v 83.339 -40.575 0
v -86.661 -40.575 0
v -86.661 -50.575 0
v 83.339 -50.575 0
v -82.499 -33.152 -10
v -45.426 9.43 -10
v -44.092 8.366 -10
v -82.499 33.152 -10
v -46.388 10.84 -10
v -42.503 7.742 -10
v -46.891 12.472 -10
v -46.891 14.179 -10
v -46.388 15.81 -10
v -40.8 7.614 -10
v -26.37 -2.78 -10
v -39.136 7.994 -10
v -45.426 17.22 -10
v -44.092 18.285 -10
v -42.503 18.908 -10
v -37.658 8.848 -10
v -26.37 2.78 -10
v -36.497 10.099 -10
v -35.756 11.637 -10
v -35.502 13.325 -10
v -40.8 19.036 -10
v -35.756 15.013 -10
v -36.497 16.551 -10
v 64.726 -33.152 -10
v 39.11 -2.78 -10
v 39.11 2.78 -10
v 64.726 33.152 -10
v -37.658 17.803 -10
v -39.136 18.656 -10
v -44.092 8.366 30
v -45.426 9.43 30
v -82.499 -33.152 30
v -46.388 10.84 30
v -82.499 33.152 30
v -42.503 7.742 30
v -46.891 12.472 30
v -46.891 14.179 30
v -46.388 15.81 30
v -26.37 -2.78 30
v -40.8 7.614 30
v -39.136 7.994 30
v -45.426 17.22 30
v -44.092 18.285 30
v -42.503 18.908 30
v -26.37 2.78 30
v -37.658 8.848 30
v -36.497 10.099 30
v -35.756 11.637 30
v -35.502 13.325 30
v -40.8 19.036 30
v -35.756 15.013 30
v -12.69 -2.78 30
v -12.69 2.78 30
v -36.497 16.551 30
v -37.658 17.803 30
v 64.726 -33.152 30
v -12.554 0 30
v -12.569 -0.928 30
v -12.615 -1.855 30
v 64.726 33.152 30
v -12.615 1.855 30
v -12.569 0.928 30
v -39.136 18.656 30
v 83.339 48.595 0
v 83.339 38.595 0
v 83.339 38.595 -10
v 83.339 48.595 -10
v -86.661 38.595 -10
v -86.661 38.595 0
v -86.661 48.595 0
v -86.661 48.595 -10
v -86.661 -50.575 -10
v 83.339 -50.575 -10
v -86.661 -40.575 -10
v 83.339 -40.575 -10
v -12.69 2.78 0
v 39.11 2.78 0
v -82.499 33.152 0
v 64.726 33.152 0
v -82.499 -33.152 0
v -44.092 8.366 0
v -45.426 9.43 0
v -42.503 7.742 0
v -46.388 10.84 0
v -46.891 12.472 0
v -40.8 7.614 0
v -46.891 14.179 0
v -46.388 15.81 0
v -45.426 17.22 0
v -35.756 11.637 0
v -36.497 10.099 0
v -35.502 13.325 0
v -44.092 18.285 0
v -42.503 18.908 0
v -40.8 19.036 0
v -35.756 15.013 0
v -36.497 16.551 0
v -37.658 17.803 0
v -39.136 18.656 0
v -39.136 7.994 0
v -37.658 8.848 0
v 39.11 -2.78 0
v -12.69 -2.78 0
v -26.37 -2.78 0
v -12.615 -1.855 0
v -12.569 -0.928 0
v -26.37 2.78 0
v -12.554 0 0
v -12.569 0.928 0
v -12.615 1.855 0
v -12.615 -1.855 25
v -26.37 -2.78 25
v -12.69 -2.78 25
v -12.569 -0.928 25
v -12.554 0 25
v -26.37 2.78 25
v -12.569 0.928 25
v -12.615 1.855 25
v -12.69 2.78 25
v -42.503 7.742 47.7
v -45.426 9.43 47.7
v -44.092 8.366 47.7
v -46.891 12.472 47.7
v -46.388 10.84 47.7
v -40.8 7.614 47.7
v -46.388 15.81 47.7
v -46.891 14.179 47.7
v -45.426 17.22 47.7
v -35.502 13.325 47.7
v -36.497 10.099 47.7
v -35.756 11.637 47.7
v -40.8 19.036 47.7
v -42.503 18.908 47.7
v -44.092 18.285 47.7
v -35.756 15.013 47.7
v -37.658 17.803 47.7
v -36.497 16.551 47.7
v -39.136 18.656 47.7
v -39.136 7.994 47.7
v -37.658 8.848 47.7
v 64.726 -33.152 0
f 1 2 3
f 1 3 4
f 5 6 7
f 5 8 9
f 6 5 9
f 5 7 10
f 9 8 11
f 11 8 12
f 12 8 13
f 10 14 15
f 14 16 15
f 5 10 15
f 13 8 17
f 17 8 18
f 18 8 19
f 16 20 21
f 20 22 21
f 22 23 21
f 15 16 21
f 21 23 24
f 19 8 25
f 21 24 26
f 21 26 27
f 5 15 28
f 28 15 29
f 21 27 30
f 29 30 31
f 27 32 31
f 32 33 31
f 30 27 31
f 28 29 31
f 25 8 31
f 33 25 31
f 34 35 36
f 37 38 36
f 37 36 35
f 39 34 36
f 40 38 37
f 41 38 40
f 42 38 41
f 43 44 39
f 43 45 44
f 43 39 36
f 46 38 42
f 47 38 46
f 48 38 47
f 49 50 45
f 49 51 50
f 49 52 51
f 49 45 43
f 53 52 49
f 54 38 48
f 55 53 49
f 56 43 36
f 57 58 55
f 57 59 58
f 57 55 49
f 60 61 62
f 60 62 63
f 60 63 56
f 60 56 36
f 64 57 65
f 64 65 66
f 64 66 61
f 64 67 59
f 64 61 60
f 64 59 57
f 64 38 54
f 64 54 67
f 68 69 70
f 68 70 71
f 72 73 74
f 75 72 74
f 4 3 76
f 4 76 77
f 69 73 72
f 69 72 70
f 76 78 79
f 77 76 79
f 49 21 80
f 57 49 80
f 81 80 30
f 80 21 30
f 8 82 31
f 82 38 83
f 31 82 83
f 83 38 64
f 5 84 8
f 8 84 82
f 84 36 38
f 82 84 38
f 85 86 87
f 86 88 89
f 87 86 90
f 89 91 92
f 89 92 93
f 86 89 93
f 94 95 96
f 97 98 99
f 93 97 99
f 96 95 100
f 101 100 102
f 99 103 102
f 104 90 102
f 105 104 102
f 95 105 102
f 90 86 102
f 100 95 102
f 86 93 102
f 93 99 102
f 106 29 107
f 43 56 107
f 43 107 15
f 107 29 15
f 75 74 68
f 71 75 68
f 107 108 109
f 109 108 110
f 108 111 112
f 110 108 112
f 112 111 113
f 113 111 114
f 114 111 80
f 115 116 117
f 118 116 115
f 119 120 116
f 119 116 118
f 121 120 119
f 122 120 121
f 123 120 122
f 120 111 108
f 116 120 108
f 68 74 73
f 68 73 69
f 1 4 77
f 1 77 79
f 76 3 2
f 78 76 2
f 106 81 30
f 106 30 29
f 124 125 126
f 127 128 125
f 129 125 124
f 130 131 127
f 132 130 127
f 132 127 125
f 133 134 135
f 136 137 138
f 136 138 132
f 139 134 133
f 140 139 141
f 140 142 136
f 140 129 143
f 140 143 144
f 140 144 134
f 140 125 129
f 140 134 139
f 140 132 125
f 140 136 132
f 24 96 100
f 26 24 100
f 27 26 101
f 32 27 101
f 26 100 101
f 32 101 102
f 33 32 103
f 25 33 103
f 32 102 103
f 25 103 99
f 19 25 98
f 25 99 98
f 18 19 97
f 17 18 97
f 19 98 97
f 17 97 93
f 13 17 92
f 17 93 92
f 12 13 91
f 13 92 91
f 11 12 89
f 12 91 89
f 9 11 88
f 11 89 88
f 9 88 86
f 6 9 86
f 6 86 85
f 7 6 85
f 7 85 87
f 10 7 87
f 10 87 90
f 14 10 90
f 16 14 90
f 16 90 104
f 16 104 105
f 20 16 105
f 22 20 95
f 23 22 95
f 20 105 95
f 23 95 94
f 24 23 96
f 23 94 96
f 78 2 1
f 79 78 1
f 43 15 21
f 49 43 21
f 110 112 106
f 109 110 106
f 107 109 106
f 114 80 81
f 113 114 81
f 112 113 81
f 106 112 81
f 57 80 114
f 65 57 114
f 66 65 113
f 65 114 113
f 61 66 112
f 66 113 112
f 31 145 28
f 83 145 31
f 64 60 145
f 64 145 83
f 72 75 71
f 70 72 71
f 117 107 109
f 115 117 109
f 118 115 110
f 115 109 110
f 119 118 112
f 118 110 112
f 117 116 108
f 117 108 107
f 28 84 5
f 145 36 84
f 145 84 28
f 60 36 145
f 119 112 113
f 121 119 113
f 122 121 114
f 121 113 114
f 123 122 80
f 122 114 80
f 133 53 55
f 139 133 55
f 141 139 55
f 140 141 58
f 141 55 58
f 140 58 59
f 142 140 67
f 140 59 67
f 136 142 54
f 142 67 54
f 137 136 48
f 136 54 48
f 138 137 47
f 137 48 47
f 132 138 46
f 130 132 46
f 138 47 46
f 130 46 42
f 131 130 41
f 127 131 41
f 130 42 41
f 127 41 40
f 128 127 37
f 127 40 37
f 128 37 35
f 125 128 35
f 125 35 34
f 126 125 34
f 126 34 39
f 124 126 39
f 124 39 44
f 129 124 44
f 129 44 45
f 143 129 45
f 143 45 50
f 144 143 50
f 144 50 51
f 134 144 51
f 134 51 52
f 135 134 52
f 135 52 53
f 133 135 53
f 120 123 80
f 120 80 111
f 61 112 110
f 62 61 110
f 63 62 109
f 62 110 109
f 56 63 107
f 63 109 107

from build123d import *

# Parameters (mm, degrees)
F0_W         = 147.224877195
F0_H         = 66.3036294561
F0_R         = 5.7267932756
F1_DEPTH     = 10
F0_W_2       = 170
F0_H_2       = 10
F1_FACE_W    = 147.224877195
F1_FACE_H    = 66.3036294561
F1_FACE_W_2  = 65.479831006
F1_FACE_H_2  = 5.5599757362
F1_FACE_R    = 5.7267932756
F1_FACE1_W   = 147.224877195
F1_FACE1_H   = 66.3036294561
F1_FACE1_W_2 = 65.479831006
F1_FACE1_H_2 = 5.5599757362
F1_FACE1_R   = 5.7267932756
F2_DEPTH     = 30
F3_DEPTH     = 25
F4_DEPTH     = 47.7


# Not quite as in the source:
# - the program builds the solid bodies; features that only make, move or delete a surface that nothing else refers to are left out


with BuildPart() as f1:
    # F0 (on Top) → F1 (new body)
    with BuildSketch(Plane.XY):
        with Locations((-8.8865962121, 0)):
            Rectangle(F0_W, F0_H)
        with BuildLine():
            ThreePointArc((-12.689527612, -2.7799878681), (-69.902287741, 0), (-12.689527612, 2.7799878681))
            Line((-12.689527612, 2.7799878681), (39.1101999373, 2.7799878681))
            Line((39.1101999373, 2.7799878681), (39.1101999373, -2.7799878681))
            Line((39.1101999373, -2.7799878681), (-12.689527612, -2.7799878681))
        make_face(mode=Mode.SUBTRACT)
        with BuildLine():
            Line((-26.3696310687, 2.7799878681), (-12.689527612, 2.7799878681))
            ThreePointArc((-12.689527612, 2.7799878681), (-69.902287741, 0), (-12.689527612, -2.7799878681))
            Line((-12.689527612, -2.7799878681), (-26.3696310687, -2.7799878681))
            Line((-26.3696310687, -2.7799878681), (-26.3696310687, 2.7799878681))
        make_face()
        with Locations((-41.2283673889, 13.3251665685)):
            Circle(F0_R, mode=Mode.SUBTRACT)
    extrude(amount=-F1_DEPTH)

    # F0 (on Top) + F1_face (on face) + F1_face1 (on face) → F2 (join)
    with BuildSketch(Plane.XY):
        with BuildLine():
            Line((-26.3696310687, 2.7799878681), (-12.689527612, 2.7799878681))
            ThreePointArc((-12.689527612, 2.7799878681), (-69.902287741, 0), (-12.689527612, -2.7799878681))
            Line((-12.689527612, -2.7799878681), (-26.3696310687, -2.7799878681))
            Line((-26.3696310687, -2.7799878681), (-26.3696310687, 2.7799878681))
        make_face()
        with Locations((-41.2283673889, 13.3251665685)):
            Circle(F0_R, mode=Mode.SUBTRACT)
        with BuildLine():
            ThreePointArc((-12.689527612, 2.7799878681), (-12.5882370901, 1.3916338697), (-12.5544470368, 0))
            ThreePointArc((-12.5544470368, 0), (-12.5882370901, -1.3916338697), (-12.689527612, -2.7799878681))
            Line((-12.689527612, -2.7799878681), (39.1101999373, -2.7799878681))
            Line((39.1101999373, -2.7799878681), (39.1101999373, 2.7799878681))
            Line((39.1101999373, 2.7799878681), (-12.689527612, 2.7799878681))
        make_face()
    with BuildSketch(Plane(origin=(-9.1256930522, -0.1477141359, 0), x_dir=(1, 0, 0), z_dir=(0, 0, 1))):
        with Locations((0.2390968402, 0.1477141359)):
            Rectangle(F1_FACE_W, F1_FACE_H)
        with Locations((15.4959774865, 0.1477141359)):
            Rectangle(F1_FACE_W_2, F1_FACE_H_2, mode=Mode.SUBTRACT)
        with Locations((-32.1026743367, 13.4728807044)):
            Circle(F1_FACE_R, mode=Mode.SUBTRACT)
    with BuildSketch(Plane(origin=(-9.1256930522, -0.1477141359, -10), x_dir=(1, 0, 0), z_dir=(0, 0, -1))):
        with Locations((0.2390968402, -0.1477141359)):
            Rectangle(F1_FACE1_W, F1_FACE1_H)
        with Locations((15.4959774865, -0.1477141359)):
            Rectangle(F1_FACE1_W_2, F1_FACE1_H_2, mode=Mode.SUBTRACT)
        with Locations((-32.1026743367, -13.4728807044)):
            Circle(F1_FACE1_R, mode=Mode.SUBTRACT)
    extrude(amount=F2_DEPTH, dir=(0, 0, 1))

    # F0 (on Top) → F4 (join)
    with BuildSketch(Plane.XY):
        with Locations((-41.2283673889, 13.3251665685)):
            Circle(F0_R)
    extrude(amount=F4_DEPTH)


with BuildPart() as f1b:
    # F0 (on Top) → F1, piece 2 (new body)
    with BuildSketch(Plane.XY):
        with Locations((-1.6613137935, -45.5752154062)):
            Rectangle(F0_W_2, F0_H_2)
    extrude(amount=-F1_DEPTH)


with BuildPart() as f1c:
    # F0 (on Top) → F1, piece 3 (new body)
    with BuildSketch(Plane.XY):
        with Locations((-1.6613137935, 43.5946881741)):
            Rectangle(F0_W_2, F0_H_2)
    extrude(amount=-F1_DEPTH)


with BuildPart() as f3:
    # F0 (on Top) → F3 (new body)
    with BuildSketch(Plane.XY):
        with BuildLine():
            ThreePointArc((-12.689527612, -2.7799878681), (-12.5882370901, -1.3916338697), (-12.5544470368, 0))
            ThreePointArc((-12.5544470368, 0), (-12.5882370901, 1.3916338697), (-12.689527612, 2.7799878681))
            Line((-12.689527612, 2.7799878681), (-26.3696310687, 2.7799878681))
            Line((-26.3696310687, 2.7799878681), (-26.3696310687, -2.7799878681))
            Line((-26.3696310687, -2.7799878681), (-12.689527612, -2.7799878681))
        make_face()
    extrude(amount=F3_DEPTH)


solid = Compound([f1.part, f1b.part, f1c.part, f3.part])
